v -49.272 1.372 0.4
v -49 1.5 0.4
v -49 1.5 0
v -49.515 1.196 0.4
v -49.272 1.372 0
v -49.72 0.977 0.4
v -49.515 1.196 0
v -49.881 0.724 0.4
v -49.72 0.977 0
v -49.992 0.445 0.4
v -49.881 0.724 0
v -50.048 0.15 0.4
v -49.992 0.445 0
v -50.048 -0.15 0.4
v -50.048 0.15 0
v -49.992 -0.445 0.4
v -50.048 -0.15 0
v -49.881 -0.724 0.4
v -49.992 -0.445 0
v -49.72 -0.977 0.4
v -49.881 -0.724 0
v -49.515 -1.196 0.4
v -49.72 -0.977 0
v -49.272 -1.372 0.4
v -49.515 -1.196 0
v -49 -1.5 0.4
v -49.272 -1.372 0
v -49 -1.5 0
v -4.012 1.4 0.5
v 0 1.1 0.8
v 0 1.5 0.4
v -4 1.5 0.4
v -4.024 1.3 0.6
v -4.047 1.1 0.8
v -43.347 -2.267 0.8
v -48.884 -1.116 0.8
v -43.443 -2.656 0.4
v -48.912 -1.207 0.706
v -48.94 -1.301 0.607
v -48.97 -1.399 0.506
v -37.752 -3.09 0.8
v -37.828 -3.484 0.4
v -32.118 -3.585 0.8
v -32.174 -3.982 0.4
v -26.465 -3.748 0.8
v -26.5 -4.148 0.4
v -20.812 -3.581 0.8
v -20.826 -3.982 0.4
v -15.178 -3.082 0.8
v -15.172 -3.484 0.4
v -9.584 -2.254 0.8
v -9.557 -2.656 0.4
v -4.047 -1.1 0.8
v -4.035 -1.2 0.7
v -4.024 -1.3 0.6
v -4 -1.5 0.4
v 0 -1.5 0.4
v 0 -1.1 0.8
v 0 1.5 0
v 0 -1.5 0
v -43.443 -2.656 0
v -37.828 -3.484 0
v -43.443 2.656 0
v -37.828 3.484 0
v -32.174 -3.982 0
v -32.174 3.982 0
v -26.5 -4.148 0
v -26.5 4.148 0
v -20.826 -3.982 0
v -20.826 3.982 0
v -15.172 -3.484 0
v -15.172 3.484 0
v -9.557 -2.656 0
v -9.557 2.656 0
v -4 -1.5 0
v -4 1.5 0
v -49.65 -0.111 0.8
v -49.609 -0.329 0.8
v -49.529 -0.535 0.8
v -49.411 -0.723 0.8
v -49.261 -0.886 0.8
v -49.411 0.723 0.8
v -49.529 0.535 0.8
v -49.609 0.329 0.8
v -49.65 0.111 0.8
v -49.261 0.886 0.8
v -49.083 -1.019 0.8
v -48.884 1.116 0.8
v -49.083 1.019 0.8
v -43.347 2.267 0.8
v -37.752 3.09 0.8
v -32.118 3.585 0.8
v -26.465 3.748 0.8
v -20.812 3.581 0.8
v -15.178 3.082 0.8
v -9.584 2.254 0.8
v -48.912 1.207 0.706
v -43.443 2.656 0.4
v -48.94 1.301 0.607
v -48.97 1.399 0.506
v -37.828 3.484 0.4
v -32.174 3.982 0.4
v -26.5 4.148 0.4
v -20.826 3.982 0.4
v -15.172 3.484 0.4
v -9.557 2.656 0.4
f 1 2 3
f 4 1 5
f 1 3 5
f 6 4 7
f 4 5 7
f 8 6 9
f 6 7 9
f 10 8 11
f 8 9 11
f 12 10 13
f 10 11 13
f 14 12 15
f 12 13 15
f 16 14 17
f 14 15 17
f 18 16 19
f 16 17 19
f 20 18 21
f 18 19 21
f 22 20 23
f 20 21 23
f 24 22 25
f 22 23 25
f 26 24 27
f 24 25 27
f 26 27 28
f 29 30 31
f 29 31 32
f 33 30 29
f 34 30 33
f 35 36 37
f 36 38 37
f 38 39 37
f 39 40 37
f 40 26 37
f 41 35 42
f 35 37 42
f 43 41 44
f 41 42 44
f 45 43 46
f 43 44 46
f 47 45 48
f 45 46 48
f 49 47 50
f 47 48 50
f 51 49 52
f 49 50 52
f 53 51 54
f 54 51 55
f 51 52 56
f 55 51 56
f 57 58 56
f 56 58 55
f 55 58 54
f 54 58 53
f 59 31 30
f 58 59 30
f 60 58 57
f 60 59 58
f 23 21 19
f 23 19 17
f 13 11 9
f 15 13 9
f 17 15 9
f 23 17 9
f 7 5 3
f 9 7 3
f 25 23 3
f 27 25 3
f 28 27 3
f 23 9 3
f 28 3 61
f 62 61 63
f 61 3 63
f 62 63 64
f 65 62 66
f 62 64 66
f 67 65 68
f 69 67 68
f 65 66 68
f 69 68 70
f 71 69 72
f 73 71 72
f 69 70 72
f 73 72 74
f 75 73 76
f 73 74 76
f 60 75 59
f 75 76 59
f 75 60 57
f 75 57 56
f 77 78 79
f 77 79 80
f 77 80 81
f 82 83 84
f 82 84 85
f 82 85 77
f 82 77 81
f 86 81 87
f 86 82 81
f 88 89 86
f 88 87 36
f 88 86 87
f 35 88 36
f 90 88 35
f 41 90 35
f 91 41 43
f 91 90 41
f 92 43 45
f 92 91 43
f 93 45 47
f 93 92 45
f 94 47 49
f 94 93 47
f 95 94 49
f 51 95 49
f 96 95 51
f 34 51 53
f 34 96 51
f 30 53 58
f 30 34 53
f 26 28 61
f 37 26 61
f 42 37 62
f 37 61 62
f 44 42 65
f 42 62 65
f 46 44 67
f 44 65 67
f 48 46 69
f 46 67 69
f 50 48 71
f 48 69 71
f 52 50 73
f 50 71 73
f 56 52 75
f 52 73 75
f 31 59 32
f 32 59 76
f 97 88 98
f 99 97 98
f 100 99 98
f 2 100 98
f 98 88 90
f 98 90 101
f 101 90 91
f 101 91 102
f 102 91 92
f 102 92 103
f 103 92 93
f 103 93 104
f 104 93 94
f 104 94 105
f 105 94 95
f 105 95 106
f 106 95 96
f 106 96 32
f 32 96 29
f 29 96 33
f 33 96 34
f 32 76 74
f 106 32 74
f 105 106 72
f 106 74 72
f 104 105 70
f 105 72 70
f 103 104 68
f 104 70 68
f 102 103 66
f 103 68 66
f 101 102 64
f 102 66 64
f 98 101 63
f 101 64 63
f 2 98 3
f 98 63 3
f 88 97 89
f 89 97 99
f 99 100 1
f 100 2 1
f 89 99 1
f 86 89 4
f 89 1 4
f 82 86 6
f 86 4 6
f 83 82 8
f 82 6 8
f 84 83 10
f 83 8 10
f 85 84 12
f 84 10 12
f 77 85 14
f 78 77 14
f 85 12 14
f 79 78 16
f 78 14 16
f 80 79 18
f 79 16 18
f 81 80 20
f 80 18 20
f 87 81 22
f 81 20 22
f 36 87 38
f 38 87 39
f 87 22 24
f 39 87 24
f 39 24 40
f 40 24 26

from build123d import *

# Parameters (mm, degrees)
PAD010_DEPTH    = 0.8
CHAMFER_SIZE    = 0.4
CHAMFER001_SIZE = 0.4
CHAMFER002_SIZE = 0.4
CHAMFER003_SIZE = 0.4


with BuildPart() as part:
    # Sketch018 → Pad010 (new body)
    with BuildSketch(Plane.XY):
        with BuildLine():
            Line((0, 1.5), (-4, 1.5))
            ThreePointArc((-4, 1.5), (-26.5, 4.148479), (-49, 1.5))
            ThreePointArc((-49, 1.5), (-50.055354, 0), (-49, -1.5))
            ThreePointArc((-49, -1.5), (-26.5, -4.148479), (-4, -1.5))
            Line((0, -1.5), (-4, -1.5))
            Line((0, 1.5), (0, -1.5))
        make_face()
    extrude(amount=PAD010_DEPTH)

    # Chamfer
    chamfer_edges = [part.edges().sort_by_distance(p)[0] for p in [
        (-2, 1.5, 0.8),
        (-2, -1.5, 0.8),
    ]]
    chamfer(chamfer_edges, length=CHAMFER_SIZE)

    # Chamfer001
    chamfer001_edges = [part.edges().sort_by_distance(p)[0] for p in [
        (-3.192094, 1.303463, 0.8),
        (-26.5, 4.148479, 0.8),
    ]]
    chamfer(chamfer001_edges, length=CHAMFER001_SIZE)

    # Chamfer002
    chamfer002_edges = [part.edges().sort_by_distance(p)[0] for p in [
        (-26.5, -4.148479, 0.8),
        (-3.192094, -1.303463, 0.8),
    ]]
    chamfer(chamfer002_edges, length=CHAMFER002_SIZE)

    # Chamfer003
    chamfer003_edges = [part.edges().sort_by_distance(p)[0] for p in [
        (-50.055354, 0, 0.8),
    ]]
    chamfer(chamfer003_edges, length=CHAMFER003_SIZE)


solid = part.part
